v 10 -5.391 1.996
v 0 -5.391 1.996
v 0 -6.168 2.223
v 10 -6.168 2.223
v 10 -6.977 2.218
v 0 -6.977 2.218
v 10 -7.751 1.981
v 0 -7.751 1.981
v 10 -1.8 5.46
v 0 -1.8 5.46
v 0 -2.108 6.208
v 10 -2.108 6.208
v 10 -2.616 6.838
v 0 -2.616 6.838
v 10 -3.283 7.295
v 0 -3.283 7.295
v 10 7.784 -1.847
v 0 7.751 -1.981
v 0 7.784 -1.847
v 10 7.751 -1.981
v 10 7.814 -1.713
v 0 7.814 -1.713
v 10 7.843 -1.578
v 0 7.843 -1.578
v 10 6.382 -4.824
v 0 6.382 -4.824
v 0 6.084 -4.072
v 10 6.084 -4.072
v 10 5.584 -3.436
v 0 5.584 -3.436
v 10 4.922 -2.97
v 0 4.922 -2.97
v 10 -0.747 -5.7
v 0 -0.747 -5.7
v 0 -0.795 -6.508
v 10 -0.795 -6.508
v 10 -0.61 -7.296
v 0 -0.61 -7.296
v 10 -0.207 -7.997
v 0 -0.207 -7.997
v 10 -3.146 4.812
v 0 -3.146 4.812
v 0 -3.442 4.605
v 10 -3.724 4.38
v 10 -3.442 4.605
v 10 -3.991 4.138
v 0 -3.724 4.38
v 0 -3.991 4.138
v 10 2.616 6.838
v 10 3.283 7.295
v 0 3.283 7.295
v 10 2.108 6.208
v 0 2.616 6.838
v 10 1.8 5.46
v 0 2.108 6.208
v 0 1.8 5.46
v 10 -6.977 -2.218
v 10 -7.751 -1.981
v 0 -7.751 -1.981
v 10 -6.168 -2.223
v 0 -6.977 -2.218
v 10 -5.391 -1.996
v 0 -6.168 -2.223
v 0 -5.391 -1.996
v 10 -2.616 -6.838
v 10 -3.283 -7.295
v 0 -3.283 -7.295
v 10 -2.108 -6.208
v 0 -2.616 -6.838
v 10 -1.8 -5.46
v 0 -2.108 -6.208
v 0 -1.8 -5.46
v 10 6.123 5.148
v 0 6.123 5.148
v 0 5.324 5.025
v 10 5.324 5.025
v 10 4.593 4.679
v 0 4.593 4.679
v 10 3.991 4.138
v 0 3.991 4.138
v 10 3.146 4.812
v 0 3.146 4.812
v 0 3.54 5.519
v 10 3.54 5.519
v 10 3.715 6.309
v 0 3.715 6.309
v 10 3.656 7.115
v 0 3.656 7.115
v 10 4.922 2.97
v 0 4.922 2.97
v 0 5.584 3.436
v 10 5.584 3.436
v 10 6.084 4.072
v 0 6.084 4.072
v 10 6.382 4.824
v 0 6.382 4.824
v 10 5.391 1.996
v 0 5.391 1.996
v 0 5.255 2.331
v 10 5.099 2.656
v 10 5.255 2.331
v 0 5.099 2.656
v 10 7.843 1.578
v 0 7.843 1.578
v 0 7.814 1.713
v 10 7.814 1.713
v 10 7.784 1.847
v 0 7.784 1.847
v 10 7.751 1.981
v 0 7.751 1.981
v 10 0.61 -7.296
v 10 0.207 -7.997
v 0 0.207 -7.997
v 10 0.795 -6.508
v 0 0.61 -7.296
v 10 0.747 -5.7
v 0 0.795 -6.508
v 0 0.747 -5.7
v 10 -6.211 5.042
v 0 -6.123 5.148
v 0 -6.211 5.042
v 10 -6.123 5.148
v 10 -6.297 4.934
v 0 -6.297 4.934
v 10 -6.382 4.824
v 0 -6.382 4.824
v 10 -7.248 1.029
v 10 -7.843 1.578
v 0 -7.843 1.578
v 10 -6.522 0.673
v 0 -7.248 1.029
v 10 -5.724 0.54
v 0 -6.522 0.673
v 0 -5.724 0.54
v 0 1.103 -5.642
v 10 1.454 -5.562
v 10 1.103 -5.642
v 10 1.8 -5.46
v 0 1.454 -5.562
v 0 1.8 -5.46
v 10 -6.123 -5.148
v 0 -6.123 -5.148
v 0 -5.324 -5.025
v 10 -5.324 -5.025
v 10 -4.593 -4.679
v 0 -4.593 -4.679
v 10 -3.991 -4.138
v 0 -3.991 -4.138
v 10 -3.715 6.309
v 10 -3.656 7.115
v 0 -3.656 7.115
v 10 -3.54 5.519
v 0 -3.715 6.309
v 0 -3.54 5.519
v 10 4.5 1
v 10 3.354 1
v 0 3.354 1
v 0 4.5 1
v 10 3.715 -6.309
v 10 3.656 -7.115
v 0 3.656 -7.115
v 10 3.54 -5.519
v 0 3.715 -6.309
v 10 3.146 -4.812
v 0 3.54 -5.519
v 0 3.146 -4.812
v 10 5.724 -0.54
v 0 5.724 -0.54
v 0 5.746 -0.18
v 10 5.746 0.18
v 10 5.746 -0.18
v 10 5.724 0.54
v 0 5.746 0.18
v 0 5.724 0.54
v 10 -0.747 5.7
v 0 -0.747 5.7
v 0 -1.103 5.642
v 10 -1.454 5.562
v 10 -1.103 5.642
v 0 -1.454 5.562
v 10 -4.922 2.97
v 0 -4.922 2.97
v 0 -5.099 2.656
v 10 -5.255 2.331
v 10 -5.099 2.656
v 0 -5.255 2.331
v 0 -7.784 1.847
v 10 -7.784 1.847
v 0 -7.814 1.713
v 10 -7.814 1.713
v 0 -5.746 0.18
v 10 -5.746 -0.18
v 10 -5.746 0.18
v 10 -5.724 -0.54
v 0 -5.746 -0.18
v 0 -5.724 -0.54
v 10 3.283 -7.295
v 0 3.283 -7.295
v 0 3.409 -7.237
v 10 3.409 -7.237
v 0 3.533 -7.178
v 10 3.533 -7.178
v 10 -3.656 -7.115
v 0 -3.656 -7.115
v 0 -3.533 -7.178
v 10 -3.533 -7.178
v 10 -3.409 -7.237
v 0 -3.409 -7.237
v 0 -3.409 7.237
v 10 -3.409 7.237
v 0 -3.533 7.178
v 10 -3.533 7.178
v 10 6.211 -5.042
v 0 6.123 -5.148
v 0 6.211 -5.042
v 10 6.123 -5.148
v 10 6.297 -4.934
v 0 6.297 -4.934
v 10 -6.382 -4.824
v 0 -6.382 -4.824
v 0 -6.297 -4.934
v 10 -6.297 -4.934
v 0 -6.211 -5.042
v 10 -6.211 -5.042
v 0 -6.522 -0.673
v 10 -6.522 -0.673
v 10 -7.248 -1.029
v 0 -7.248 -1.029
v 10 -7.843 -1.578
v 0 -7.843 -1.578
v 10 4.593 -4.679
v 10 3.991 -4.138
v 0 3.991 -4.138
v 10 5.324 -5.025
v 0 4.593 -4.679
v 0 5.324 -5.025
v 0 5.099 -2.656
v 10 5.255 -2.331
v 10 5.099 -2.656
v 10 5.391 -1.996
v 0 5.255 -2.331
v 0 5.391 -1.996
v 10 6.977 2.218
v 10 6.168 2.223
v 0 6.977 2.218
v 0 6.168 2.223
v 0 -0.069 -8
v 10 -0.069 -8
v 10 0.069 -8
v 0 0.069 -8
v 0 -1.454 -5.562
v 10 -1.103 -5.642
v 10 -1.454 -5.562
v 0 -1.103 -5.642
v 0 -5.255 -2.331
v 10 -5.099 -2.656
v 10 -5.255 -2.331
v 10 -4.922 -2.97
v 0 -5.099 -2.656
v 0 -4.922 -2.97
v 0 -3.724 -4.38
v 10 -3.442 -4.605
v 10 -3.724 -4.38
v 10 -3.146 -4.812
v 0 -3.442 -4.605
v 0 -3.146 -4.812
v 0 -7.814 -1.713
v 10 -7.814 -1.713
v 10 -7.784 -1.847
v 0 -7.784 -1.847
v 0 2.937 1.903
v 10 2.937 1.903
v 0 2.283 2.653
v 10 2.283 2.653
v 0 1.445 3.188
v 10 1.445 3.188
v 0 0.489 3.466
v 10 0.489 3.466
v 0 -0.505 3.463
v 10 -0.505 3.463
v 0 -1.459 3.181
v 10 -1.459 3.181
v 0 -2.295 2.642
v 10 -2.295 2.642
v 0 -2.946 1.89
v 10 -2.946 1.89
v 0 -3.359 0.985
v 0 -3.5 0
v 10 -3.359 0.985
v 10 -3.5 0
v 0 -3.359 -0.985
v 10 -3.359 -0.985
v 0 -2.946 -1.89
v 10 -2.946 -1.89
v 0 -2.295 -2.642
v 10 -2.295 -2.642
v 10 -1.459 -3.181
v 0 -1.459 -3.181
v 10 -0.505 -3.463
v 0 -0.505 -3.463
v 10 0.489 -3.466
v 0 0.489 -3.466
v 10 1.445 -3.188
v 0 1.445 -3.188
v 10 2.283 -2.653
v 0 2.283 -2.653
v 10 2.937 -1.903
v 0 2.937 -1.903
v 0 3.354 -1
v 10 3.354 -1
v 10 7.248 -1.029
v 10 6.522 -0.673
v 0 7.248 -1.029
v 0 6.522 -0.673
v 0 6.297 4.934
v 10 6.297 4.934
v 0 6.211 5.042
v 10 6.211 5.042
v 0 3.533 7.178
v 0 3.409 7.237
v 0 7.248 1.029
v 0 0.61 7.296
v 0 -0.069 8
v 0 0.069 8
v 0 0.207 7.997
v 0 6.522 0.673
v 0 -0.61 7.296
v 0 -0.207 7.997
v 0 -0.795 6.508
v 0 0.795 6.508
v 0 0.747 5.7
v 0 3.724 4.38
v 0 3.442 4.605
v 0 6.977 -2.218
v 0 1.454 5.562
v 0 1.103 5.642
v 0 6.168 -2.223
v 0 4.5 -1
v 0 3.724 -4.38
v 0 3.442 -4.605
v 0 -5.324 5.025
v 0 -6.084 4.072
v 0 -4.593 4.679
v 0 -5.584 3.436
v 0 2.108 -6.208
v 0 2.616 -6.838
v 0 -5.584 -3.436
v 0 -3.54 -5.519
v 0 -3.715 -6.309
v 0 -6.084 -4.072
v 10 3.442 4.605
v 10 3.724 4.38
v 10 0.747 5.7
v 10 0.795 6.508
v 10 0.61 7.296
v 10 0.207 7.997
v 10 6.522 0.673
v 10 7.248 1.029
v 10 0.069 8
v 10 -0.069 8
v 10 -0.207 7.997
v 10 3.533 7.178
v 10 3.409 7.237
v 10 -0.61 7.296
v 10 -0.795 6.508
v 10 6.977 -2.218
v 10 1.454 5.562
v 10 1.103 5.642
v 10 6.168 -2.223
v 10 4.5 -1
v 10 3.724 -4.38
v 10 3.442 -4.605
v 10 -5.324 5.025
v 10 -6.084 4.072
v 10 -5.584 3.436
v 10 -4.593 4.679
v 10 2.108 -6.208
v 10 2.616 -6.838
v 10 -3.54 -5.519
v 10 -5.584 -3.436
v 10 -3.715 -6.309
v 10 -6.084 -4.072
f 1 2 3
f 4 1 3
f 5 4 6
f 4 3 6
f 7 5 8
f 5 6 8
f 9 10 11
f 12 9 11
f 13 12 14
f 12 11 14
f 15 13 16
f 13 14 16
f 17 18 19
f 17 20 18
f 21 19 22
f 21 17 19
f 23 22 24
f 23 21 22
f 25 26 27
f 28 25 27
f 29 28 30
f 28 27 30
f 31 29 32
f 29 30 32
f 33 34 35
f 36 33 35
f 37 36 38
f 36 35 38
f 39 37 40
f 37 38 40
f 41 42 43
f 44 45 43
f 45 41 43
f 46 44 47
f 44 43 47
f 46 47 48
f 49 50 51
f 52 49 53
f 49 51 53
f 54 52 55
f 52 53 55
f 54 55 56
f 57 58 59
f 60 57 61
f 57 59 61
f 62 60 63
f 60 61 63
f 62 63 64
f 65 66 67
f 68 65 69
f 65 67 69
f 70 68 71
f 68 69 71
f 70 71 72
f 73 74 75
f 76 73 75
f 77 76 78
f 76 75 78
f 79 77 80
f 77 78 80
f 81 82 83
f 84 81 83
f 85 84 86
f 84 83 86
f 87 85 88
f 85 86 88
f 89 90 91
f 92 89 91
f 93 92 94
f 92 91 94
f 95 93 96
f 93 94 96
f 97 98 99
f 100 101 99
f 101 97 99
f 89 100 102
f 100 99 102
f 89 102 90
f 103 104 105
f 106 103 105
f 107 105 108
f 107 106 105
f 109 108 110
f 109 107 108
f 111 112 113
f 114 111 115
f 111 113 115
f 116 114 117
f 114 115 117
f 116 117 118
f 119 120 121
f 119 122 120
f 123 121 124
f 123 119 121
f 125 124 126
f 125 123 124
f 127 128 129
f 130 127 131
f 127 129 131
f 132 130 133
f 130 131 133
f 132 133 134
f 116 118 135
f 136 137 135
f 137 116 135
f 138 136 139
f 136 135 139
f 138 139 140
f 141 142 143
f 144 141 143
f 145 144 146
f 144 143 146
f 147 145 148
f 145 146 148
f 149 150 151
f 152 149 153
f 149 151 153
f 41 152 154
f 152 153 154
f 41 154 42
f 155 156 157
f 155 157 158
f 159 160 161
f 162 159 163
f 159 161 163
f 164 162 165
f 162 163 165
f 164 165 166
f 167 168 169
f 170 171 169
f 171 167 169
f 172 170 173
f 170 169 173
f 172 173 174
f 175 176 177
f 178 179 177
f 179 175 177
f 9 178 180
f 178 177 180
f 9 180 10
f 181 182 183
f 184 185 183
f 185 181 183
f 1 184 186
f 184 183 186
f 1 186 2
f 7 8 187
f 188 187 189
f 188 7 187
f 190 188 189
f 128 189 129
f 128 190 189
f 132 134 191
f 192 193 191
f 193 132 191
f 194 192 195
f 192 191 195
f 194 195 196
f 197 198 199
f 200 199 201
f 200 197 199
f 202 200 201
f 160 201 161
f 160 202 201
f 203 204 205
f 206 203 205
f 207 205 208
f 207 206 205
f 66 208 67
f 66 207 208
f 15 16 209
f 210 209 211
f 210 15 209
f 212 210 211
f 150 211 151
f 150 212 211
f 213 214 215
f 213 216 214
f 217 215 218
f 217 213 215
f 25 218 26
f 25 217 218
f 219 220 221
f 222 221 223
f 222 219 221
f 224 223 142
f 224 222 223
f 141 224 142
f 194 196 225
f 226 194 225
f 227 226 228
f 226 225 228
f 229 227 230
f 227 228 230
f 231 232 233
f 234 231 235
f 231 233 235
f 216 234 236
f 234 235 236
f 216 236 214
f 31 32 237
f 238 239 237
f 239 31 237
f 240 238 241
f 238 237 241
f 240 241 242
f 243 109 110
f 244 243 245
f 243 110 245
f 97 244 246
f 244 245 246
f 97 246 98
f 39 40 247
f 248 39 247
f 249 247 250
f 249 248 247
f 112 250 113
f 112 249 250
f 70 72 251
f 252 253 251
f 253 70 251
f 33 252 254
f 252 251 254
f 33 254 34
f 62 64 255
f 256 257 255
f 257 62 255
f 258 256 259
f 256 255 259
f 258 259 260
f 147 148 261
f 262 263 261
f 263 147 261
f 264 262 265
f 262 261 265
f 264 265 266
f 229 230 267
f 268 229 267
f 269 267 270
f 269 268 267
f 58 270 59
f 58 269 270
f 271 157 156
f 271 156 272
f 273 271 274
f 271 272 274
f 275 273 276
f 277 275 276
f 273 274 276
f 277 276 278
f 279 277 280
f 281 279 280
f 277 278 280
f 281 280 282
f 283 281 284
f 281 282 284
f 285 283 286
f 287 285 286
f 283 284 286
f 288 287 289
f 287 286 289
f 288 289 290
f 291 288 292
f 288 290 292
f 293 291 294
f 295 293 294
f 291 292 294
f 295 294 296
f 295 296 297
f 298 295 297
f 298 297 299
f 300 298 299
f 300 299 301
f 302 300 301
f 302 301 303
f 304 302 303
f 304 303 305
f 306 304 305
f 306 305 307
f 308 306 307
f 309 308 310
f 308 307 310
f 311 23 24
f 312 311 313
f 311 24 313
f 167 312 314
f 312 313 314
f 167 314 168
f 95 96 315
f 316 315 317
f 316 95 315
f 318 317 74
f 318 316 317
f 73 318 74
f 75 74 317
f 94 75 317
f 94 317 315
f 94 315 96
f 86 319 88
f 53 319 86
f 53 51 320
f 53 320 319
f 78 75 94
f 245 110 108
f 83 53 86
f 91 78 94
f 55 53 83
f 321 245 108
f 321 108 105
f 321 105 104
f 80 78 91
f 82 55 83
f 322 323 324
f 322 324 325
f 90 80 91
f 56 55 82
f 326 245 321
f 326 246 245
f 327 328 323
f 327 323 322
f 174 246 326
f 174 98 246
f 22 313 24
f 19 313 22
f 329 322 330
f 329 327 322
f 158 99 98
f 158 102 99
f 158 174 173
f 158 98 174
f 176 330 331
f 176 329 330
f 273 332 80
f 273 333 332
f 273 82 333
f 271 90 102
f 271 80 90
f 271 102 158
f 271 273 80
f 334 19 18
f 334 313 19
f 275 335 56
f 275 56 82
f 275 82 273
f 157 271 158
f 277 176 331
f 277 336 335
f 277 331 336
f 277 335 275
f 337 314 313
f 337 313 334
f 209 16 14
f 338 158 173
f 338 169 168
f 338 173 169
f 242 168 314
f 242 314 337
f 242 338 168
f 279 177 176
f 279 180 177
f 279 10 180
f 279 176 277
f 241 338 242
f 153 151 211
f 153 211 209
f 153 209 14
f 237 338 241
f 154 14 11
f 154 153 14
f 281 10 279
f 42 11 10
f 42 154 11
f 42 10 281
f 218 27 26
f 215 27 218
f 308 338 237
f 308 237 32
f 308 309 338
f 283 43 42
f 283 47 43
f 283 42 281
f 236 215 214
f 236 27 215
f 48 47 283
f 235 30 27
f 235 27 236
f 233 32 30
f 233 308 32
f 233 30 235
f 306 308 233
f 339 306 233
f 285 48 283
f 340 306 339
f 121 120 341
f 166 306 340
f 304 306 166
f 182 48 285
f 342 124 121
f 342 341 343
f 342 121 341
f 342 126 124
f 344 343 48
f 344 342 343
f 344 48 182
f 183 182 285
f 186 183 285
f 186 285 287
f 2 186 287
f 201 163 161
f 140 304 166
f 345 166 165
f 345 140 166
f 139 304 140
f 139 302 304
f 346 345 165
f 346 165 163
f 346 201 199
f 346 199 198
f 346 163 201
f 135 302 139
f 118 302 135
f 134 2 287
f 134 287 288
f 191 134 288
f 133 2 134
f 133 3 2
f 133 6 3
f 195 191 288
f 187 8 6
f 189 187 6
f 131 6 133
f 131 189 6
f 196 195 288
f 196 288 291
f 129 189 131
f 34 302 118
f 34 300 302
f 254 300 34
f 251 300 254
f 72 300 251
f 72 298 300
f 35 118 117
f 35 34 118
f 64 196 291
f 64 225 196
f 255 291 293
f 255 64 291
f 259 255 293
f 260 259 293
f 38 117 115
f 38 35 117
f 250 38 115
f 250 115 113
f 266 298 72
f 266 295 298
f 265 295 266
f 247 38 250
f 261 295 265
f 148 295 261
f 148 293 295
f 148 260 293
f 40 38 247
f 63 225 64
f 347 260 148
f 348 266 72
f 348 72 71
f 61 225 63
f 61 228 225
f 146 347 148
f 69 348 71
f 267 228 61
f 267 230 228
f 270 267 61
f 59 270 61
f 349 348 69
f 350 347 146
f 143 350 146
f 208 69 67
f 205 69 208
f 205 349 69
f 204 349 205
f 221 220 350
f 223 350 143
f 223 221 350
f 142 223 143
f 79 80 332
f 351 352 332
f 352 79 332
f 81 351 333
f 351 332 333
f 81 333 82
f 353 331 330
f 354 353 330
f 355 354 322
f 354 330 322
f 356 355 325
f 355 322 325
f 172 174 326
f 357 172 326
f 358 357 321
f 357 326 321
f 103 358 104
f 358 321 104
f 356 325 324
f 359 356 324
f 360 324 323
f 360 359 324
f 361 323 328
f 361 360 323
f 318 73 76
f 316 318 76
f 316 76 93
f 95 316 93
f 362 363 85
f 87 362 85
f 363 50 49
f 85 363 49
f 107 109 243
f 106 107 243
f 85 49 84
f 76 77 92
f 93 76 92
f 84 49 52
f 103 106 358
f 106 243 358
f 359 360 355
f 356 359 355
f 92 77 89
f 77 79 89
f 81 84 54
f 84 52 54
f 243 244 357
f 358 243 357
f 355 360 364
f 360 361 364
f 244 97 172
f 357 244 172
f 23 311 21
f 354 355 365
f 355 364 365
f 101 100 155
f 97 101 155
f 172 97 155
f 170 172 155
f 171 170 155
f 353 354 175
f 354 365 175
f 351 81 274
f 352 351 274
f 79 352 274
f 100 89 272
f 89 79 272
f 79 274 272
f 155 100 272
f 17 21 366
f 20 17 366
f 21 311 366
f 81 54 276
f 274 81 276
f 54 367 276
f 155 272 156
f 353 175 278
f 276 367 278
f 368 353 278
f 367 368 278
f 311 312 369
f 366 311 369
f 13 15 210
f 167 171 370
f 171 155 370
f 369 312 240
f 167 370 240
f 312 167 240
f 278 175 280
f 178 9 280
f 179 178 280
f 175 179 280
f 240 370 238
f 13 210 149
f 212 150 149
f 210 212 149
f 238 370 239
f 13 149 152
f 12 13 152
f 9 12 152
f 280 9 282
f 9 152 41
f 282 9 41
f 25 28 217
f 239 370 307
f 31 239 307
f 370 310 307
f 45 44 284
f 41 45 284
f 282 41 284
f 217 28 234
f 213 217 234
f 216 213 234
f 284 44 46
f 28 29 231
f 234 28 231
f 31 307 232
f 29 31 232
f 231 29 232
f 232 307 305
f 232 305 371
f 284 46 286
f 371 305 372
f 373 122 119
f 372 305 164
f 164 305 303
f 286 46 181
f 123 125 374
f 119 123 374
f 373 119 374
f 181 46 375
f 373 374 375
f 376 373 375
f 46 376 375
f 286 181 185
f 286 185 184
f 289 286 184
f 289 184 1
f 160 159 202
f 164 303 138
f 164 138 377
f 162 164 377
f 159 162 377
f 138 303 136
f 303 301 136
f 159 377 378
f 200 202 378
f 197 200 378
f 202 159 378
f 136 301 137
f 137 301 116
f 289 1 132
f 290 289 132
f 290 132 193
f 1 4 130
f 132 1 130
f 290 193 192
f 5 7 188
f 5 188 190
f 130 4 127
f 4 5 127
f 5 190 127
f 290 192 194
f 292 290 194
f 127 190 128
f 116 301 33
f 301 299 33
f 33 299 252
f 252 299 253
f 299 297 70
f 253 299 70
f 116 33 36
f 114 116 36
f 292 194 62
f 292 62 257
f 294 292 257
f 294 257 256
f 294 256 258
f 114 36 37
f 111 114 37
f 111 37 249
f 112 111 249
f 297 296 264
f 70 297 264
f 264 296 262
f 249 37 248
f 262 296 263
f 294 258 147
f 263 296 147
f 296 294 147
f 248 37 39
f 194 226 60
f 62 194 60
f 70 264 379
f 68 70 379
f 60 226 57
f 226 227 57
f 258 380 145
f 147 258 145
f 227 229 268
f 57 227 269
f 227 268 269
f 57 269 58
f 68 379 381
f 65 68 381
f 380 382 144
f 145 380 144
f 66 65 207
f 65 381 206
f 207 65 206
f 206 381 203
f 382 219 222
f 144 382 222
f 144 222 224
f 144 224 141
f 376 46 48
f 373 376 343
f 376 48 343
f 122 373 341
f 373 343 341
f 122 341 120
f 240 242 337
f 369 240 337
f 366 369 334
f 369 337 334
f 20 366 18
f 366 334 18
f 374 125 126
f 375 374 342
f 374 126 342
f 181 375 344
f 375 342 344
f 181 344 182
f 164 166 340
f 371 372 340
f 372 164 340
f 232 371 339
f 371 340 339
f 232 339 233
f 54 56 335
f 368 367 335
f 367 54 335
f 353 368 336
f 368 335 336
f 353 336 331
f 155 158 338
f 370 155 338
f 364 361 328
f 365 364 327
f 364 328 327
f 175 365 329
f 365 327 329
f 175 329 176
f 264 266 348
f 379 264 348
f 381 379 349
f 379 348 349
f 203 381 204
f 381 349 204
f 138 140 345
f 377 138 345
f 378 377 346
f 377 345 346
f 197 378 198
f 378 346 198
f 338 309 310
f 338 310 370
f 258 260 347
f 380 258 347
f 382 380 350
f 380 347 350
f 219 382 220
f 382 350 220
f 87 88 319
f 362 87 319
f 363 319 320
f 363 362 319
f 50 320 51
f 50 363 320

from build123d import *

# Parameters (mm, degrees)
BASPROSKE_W        = 10
BASPROSKE_H        = 8
TOOTHCUT_DEPTH     = 16.099668871
TEETHCUTS_COUNT    = 14
TEETHCUTS_ANGLE    = 334.285714286
BORSKE_R           = 0.4
BORE_DEPTH         = 50.0000508
SKETCH1_R          = 3.5
CUT_EXTRUDE1_DEPTH = 10
SKETCH2_W          = 2
SKETCH2_H          = 2
CUT_EXTRUDE2_DEPTH = 10


with BuildPart() as part:
    # BasProSke → Base-Revolve (revolve)
    with BuildSketch(Plane(origin=(0, 0, 0), x_dir=(1, 0, 0), z_dir=(0, 1, 0)), mode=Mode.PRIVATE) as base_revolve_sk:
        with Locations((5, 4)):
            Rectangle(BASPROSKE_W, BASPROSKE_H)
    revolve(base_revolve_sk.sketch.rotate(Axis((-10, 0, 0), (1, 0, 0)), 180), axis=Axis((-10, 0, 0), (1, 0, 0)))

    # TooCutSke → ToothCut (cut, through all)
    with BuildSketch(Plane(origin=(0, 0, 0), x_dir=(0, 0, -1), z_dir=(1, 0, 0))):
        with BuildLine():
            ThreePointArc((0.540393256, 5.723545765), (0, 5.749), (-0.540393256, 5.723545765))
            ThreePointArc((-0.540393256, 5.723545765), (-0.832220085, 6.912663993), (-1.603550271, 7.863566092))
            ThreePointArc((-1.603550271, 7.863566092), (0, 8.0254), (1.603550271, 7.863566092))
            ThreePointArc((1.603550271, 7.863566092), (0.832220085, 6.912663993), (0.540393256, 5.723545765))
        make_face()
    toothcut = extrude(amount=TOOTHCUT_DEPTH, mode=Mode.SUBTRACT)

    # TeethCuts: ToothCut ×14 about axis
    teethcuts_axis = Axis((-10, 0, 0), (1, 0, 0))
    for i in range(1, TEETHCUTS_COUNT):
        add(toothcut.rotate(teethcuts_axis, i * TEETHCUTS_ANGLE / (TEETHCUTS_COUNT - 1)), mode=Mode.SUBTRACT)

    # BorSke → Bore (cut, symmetric)
    with BuildSketch(Plane(origin=(0, 0, 0), x_dir=(0, 0, -1), z_dir=(1, 0, 0))):
        with Locations(Location((0, 0, 0), (0, 0, 180))):
            Circle(BORSKE_R)
    extrude(amount=BORE_DEPTH, both=True, mode=Mode.SUBTRACT)

    # Sketch1 → Cut-Extrude1 (cut)
    with BuildSketch(Plane(origin=(10, 0, 0), x_dir=(0, 0, -1), z_dir=(1, 0, 0))):
        Circle(SKETCH1_R)
    extrude(amount=-CUT_EXTRUDE1_DEPTH, mode=Mode.SUBTRACT)

    # Sketch2 → Cut-Extrude2 (cut)
    with BuildSketch(Plane(origin=(10, 0, 0), x_dir=(0, 0, -1), z_dir=(1, 0, 0))):
        with Locations((0, 3.5)):
            Rectangle(SKETCH2_W, SKETCH2_H)
    extrude(amount=-CUT_EXTRUDE2_DEPTH, mode=Mode.SUBTRACT)


solid = part.part
